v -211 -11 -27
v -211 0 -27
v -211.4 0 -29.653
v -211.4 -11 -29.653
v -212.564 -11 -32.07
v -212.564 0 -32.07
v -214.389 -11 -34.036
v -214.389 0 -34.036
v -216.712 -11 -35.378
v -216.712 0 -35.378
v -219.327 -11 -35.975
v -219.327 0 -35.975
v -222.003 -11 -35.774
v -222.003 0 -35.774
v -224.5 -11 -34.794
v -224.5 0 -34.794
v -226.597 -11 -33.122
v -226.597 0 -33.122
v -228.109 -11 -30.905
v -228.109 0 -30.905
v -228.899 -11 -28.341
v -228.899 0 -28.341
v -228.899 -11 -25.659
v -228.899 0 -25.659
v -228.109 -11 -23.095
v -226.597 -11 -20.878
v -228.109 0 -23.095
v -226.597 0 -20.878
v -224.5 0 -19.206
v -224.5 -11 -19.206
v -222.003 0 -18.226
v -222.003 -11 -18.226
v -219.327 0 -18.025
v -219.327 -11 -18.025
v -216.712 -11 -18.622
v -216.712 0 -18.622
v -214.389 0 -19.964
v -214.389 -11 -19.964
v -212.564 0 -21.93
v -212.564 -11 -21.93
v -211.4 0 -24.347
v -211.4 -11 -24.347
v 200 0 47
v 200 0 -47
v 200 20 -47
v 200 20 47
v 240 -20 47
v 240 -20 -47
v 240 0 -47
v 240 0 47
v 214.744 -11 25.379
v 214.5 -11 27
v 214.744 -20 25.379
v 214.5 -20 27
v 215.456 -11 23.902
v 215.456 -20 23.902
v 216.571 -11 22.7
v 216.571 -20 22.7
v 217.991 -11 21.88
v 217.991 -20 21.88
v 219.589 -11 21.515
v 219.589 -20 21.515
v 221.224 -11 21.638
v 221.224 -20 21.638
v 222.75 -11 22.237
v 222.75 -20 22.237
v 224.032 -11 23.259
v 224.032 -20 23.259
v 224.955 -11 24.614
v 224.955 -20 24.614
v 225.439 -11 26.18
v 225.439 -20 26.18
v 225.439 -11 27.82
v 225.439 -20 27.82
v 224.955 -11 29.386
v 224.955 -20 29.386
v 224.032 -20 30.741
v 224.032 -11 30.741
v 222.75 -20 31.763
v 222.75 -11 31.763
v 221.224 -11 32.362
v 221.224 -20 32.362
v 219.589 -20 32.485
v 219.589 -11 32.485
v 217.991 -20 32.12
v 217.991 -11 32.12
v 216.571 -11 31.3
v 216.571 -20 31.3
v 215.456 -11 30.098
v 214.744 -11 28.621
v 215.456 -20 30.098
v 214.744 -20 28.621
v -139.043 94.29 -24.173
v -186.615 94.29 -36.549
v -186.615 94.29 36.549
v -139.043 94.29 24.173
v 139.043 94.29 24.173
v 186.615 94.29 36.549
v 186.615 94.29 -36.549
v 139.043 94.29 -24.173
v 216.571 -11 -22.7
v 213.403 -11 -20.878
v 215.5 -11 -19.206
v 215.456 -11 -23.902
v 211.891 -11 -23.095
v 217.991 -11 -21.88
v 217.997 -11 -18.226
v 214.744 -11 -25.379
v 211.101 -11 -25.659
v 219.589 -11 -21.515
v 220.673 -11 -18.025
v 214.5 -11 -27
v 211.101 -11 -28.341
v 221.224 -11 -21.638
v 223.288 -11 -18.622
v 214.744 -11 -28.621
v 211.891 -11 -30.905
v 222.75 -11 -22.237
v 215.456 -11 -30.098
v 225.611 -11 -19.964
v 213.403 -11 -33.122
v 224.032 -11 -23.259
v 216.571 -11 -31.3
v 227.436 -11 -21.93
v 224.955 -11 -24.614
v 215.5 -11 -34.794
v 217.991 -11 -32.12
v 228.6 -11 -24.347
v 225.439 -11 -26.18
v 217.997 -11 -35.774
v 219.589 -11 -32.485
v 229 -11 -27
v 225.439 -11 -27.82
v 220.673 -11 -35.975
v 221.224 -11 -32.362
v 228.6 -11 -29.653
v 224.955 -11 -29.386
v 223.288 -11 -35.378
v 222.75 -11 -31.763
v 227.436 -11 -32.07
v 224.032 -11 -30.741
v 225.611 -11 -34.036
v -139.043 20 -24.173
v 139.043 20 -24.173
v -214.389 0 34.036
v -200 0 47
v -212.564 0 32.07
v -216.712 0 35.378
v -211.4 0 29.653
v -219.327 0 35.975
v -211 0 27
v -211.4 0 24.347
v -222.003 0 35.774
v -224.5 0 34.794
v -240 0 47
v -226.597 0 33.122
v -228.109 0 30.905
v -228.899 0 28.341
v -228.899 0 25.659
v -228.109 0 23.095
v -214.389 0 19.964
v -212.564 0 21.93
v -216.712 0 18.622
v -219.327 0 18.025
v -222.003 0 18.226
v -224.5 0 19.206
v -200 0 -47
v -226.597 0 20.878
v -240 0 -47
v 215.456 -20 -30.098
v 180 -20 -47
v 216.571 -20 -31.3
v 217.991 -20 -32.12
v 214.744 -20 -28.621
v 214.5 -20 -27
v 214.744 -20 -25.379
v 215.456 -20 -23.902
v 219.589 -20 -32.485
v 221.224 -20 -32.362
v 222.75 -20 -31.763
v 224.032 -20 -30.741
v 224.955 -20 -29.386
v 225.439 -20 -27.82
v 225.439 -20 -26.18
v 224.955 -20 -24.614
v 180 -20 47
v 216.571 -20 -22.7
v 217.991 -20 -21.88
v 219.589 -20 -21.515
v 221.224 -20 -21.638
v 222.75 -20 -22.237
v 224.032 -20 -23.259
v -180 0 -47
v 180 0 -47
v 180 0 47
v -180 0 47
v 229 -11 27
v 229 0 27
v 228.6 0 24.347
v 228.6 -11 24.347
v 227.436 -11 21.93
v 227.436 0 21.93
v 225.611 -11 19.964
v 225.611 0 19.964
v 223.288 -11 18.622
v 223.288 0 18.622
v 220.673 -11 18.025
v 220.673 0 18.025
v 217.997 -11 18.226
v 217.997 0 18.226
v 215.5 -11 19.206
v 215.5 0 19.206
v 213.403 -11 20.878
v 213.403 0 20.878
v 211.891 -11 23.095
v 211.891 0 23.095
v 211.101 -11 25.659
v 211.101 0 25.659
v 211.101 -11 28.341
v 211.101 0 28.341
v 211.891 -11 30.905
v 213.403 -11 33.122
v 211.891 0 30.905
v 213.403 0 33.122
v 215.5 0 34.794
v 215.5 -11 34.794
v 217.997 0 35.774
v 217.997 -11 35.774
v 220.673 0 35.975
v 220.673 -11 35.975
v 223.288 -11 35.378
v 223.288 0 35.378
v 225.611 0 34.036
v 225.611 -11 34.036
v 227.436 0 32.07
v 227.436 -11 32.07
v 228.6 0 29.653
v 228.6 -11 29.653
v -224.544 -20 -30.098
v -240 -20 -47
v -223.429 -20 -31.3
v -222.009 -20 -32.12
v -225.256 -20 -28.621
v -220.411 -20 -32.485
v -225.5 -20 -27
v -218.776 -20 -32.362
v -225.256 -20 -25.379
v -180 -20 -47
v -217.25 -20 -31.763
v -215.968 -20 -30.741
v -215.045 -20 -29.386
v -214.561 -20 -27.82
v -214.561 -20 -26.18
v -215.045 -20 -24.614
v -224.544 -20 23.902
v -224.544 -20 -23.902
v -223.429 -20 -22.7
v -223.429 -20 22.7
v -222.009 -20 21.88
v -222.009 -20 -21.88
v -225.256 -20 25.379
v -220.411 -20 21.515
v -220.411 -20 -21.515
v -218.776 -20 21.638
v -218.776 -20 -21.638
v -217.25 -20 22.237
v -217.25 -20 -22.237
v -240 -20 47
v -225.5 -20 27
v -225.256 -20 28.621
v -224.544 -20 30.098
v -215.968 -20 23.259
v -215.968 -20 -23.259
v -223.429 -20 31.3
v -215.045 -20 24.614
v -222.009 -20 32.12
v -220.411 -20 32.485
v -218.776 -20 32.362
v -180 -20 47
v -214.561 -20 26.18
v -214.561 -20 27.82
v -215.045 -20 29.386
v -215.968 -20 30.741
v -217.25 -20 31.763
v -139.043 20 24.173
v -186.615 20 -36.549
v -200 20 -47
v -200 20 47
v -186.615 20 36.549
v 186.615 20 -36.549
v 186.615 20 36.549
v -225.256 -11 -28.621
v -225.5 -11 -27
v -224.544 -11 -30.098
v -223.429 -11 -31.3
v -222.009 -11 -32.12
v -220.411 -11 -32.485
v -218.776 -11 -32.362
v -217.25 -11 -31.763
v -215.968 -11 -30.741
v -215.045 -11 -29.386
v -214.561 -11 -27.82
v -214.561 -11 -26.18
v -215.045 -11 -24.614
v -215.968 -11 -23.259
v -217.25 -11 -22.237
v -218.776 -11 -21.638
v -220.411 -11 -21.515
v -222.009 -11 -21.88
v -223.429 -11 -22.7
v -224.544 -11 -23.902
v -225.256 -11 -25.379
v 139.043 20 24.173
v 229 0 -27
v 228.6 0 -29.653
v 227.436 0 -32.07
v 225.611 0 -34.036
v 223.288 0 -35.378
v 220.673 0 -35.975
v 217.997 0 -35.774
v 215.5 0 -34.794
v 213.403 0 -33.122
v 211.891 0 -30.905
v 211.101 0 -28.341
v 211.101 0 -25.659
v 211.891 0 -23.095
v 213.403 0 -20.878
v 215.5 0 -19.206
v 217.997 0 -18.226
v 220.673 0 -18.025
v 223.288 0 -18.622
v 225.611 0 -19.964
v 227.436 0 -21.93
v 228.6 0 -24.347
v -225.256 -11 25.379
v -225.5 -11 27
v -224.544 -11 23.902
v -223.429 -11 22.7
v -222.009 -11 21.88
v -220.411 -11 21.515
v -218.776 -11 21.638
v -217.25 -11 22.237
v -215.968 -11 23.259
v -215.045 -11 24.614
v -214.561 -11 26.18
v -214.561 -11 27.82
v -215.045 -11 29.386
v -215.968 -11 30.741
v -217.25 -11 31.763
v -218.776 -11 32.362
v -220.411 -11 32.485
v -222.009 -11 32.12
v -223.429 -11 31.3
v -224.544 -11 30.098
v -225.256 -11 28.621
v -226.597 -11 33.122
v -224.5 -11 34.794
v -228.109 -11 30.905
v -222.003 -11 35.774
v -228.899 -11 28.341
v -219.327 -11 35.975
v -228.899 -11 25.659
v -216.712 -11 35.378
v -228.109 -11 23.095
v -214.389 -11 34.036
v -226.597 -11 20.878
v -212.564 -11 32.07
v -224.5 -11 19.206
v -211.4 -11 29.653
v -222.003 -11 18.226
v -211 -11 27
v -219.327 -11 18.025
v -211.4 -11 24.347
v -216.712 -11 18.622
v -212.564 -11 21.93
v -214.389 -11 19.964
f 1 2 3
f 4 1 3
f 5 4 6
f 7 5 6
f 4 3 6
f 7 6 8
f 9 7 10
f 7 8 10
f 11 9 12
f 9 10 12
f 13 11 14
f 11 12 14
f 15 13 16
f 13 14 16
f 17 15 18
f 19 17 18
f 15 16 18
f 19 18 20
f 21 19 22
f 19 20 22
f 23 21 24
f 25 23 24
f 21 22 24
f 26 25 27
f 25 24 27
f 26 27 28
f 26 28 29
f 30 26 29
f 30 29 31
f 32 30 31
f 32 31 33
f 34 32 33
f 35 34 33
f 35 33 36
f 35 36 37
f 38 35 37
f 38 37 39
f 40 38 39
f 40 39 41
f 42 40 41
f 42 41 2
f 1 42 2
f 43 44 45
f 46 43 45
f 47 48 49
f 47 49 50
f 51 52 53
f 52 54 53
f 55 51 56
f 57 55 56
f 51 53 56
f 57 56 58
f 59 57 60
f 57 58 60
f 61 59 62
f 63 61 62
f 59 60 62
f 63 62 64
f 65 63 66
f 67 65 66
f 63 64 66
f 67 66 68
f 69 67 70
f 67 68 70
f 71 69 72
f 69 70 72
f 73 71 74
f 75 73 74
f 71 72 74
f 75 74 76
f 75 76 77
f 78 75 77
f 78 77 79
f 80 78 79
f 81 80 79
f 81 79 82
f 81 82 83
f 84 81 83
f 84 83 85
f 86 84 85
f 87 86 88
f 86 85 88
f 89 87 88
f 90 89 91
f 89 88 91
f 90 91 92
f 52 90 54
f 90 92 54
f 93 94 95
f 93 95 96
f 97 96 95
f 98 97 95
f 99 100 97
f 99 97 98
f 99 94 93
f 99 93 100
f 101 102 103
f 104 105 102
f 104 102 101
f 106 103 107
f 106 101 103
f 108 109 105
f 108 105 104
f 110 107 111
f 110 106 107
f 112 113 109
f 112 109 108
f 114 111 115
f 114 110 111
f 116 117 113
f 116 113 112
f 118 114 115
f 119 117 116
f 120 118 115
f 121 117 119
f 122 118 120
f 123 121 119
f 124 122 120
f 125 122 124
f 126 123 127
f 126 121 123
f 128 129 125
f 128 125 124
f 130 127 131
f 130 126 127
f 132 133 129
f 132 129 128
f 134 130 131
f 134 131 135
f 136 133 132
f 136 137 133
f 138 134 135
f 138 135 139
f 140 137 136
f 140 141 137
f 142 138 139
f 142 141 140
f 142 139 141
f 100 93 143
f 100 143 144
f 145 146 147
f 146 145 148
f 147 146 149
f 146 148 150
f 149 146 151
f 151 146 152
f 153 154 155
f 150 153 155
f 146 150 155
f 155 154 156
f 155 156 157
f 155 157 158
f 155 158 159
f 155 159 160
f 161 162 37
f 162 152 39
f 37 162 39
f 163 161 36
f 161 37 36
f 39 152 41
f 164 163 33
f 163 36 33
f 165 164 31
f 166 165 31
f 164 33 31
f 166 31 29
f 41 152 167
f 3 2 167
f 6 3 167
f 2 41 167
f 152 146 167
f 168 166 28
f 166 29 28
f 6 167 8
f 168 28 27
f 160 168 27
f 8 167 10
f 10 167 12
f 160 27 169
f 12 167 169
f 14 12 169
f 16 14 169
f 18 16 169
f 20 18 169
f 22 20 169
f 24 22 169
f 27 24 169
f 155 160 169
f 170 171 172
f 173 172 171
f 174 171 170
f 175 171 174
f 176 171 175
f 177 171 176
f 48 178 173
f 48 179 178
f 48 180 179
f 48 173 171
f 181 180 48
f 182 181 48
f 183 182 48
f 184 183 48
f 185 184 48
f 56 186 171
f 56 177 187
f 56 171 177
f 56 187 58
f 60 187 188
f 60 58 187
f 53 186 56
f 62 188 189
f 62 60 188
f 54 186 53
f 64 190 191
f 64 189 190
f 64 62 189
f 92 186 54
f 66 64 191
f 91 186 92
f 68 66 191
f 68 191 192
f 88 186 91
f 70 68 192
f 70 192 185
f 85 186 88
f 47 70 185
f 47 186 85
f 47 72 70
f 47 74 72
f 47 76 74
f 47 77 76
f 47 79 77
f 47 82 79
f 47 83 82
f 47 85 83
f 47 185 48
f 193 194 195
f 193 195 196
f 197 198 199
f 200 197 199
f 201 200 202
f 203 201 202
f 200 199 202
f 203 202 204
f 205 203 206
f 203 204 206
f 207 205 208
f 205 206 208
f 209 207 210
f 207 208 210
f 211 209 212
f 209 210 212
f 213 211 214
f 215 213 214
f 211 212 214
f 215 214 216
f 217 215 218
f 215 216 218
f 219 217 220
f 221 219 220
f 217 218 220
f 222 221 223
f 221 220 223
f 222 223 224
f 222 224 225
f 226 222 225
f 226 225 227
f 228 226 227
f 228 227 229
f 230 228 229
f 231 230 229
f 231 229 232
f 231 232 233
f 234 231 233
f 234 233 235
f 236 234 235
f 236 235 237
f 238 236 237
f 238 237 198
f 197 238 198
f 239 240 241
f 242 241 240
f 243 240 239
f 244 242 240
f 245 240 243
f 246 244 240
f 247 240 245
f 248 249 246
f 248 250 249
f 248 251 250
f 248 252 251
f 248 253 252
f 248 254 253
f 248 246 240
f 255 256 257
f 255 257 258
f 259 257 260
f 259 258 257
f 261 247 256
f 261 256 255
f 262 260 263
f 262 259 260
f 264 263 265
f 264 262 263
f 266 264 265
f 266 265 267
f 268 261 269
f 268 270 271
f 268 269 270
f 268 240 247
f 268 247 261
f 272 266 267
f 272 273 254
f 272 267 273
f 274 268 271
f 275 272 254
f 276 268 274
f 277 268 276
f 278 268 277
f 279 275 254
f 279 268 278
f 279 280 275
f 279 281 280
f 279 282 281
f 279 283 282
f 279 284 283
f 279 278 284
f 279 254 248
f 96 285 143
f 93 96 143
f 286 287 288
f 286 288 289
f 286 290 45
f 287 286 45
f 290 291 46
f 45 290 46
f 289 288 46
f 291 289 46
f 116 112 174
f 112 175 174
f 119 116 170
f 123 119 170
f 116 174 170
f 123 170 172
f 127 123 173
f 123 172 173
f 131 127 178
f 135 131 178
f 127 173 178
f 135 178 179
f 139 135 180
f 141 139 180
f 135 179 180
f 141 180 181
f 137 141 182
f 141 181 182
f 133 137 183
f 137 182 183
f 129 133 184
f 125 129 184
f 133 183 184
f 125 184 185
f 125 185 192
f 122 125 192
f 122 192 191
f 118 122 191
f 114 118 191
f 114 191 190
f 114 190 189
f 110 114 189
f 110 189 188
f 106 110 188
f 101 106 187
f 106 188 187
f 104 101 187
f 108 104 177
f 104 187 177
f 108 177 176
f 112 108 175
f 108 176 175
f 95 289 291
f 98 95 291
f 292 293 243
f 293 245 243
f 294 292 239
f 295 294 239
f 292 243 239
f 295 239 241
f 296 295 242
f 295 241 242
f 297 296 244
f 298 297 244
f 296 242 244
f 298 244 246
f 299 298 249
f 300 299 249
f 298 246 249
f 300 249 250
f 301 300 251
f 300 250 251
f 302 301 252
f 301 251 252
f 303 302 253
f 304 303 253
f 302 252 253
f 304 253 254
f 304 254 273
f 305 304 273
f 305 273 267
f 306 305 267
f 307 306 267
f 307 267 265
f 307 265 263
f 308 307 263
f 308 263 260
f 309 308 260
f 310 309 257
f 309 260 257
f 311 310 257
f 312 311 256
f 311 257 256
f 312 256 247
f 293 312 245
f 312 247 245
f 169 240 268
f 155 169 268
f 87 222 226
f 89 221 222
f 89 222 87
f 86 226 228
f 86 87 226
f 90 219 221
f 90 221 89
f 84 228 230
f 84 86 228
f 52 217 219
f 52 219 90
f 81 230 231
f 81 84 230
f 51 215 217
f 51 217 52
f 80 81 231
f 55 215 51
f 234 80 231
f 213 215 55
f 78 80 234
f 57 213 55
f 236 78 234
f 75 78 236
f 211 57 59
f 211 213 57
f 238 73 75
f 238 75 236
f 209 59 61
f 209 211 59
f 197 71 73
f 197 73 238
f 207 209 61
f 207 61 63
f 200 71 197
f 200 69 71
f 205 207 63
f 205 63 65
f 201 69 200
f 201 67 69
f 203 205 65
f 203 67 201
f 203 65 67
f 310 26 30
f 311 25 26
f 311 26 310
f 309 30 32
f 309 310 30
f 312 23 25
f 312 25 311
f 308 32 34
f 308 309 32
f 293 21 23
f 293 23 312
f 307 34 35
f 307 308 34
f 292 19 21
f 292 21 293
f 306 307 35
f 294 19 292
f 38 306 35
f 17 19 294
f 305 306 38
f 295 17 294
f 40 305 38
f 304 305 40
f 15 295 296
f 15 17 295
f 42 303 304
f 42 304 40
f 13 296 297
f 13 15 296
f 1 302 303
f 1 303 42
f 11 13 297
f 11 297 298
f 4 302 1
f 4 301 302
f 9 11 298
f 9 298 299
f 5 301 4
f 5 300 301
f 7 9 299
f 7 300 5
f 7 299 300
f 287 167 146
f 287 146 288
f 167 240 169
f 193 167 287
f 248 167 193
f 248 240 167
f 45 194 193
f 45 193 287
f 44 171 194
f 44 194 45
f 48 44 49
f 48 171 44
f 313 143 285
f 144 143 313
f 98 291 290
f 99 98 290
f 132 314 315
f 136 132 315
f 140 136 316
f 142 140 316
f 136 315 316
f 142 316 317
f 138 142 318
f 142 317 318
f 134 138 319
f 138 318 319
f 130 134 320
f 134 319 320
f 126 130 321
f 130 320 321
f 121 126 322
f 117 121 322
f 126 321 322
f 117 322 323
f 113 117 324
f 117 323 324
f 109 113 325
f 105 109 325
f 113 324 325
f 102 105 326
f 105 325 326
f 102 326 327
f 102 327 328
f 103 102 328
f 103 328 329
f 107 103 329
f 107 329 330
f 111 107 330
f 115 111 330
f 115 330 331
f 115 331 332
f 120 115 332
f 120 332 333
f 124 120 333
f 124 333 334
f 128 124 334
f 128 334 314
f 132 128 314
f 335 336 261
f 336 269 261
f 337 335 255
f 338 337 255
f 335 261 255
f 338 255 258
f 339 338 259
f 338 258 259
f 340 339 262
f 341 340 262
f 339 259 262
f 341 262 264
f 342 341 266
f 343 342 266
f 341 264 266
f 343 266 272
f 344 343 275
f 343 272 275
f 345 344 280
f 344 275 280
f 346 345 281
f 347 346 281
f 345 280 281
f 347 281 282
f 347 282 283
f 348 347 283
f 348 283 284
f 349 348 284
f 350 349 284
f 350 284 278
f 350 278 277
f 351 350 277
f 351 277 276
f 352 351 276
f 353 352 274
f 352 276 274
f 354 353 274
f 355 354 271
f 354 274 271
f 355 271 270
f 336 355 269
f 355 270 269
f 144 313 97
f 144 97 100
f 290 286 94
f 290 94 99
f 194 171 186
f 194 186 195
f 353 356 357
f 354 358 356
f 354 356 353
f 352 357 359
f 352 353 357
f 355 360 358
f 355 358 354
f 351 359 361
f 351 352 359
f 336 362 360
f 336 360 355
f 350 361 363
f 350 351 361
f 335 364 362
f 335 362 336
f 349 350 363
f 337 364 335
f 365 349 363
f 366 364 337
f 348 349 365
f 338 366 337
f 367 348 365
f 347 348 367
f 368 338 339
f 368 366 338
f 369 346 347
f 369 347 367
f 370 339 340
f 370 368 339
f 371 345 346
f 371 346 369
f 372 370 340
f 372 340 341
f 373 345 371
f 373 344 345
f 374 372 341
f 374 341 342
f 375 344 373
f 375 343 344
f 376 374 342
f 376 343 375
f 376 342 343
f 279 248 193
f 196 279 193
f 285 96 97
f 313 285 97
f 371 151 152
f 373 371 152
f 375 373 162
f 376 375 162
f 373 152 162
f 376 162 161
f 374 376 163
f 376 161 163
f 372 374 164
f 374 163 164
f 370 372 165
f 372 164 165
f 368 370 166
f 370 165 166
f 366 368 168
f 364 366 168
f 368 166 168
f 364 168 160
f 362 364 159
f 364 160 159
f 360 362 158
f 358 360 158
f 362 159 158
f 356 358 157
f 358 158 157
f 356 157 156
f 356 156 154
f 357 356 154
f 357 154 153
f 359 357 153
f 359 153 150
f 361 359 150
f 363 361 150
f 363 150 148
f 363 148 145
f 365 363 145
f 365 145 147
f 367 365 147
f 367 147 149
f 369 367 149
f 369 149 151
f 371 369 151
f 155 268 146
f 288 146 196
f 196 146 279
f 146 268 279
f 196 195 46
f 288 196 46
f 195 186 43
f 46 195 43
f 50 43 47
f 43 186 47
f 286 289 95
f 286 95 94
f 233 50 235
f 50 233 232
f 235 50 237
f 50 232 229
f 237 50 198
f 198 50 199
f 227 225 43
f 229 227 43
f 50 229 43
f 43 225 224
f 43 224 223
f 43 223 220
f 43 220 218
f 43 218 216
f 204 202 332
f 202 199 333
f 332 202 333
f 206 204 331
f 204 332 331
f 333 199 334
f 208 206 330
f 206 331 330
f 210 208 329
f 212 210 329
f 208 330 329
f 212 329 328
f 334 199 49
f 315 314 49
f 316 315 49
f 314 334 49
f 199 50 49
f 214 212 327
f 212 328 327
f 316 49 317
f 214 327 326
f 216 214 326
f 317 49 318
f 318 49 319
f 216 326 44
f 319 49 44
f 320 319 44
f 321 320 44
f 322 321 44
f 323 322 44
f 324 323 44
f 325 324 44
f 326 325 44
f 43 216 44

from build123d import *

# Parameters (mm, degrees)
SKETCH_1_W                    = 480
SKETCH_1_H                    = 94
EXTRUDE_1_DEPTH               = 40
SKETCH_2_W                    = 40
SKETCH_2_H                    = 20
CUT_EXTRUDE_1_DEPTH           = 259.526594377
SKETCH_3_W                    = 360
SKETCH_3_H                    = 20
CUT_EXTRUDE_2_DEPTH           = 259.526594377
SKETCH_4_W                    = 40
SKETCH_4_H                    = 20
CUT_EXTRUDE_3_DEPTH           = 259.526594377
HOLE_WIZARD_M10_1_D           = 11
HOLE_WIZARD_M10_1_CBORE_D     = 18
HOLE_WIZARD_M10_1_CBORE_DEPTH = 11
SKETCH_14_W                   = 373.229690018
SKETCH_14_H                   = 73.09887193
EXTRUDE_2_DEPTH               = 74.29
SKETCH_15_W                   = 278.085126552
SKETCH_15_H                   = 48.34581477
CUT_EXTRUDE_4_DEPTH           = 74.29


with BuildPart() as part:
    # 草图1 → 凸台-拉伸1 (new body)
    with BuildSketch(Plane.XZ.offset(20)):
        Rectangle(SKETCH_1_W, SKETCH_1_H)
    extrude(amount=-EXTRUDE_1_DEPTH)

    # 草图2 → 切除-拉伸1 (cut, through all)
    with BuildSketch(Plane(origin=(0, 0, -47), x_dir=(-1, 0, 0), z_dir=(0, 0, -1))):
        with Locations((220, 10)):
            Rectangle(SKETCH_2_W, SKETCH_2_H)
    extrude(amount=-CUT_EXTRUDE_1_DEPTH, mode=Mode.SUBTRACT)

    # 草图3 → 切除-拉伸2 (cut, through all)
    with BuildSketch(Plane(origin=(0, 0, -47), x_dir=(-1, 0, 0), z_dir=(0, 0, -1))):
        with Locations((0, -10)):
            Rectangle(SKETCH_3_W, SKETCH_3_H)
    extrude(amount=-CUT_EXTRUDE_2_DEPTH, mode=Mode.SUBTRACT)

    # 草图4 → 切除-拉伸3 (cut, through all)
    with BuildSketch(Plane(origin=(0, 0, -47), x_dir=(-1, 0, 0), z_dir=(0, 0, -1))):
        with Locations((-220, 10)):
            Rectangle(SKETCH_4_W, SKETCH_4_H)
    extrude(amount=-CUT_EXTRUDE_3_DEPTH, mode=Mode.SUBTRACT)

    # M10 六角头螺栓的柱形沉头孔1 (through all)
    with Locations(Plane(origin=(0, 0, 0), x_dir=(1, 0, 0), z_dir=(0, 1, 0))):
        with Locations((220, -27), (220, 27), (-220, -27), (-220, 27)):
            CounterBoreHole(HOLE_WIZARD_M10_1_D / 2, HOLE_WIZARD_M10_1_CBORE_D / 2, HOLE_WIZARD_M10_1_CBORE_DEPTH)

    # 草图14 → 凸台-拉伸2 (add)
    with BuildSketch(Plane(origin=(0, 20, 0), x_dir=(1, 0, 0), z_dir=(0, 1, 0))):
        Rectangle(SKETCH_14_W, SKETCH_14_H)
    extrude(amount=EXTRUDE_2_DEPTH)

    # 草图15 → 切除-拉伸4 (cut)
    with BuildSketch(Plane(origin=(0, 94.29, 0), x_dir=(1, 0, 0), z_dir=(0, 1, 0))):
        Rectangle(SKETCH_15_W, SKETCH_15_H)
    extrude(amount=-CUT_EXTRUDE_4_DEPTH, mode=Mode.SUBTRACT)


solid = part.part
